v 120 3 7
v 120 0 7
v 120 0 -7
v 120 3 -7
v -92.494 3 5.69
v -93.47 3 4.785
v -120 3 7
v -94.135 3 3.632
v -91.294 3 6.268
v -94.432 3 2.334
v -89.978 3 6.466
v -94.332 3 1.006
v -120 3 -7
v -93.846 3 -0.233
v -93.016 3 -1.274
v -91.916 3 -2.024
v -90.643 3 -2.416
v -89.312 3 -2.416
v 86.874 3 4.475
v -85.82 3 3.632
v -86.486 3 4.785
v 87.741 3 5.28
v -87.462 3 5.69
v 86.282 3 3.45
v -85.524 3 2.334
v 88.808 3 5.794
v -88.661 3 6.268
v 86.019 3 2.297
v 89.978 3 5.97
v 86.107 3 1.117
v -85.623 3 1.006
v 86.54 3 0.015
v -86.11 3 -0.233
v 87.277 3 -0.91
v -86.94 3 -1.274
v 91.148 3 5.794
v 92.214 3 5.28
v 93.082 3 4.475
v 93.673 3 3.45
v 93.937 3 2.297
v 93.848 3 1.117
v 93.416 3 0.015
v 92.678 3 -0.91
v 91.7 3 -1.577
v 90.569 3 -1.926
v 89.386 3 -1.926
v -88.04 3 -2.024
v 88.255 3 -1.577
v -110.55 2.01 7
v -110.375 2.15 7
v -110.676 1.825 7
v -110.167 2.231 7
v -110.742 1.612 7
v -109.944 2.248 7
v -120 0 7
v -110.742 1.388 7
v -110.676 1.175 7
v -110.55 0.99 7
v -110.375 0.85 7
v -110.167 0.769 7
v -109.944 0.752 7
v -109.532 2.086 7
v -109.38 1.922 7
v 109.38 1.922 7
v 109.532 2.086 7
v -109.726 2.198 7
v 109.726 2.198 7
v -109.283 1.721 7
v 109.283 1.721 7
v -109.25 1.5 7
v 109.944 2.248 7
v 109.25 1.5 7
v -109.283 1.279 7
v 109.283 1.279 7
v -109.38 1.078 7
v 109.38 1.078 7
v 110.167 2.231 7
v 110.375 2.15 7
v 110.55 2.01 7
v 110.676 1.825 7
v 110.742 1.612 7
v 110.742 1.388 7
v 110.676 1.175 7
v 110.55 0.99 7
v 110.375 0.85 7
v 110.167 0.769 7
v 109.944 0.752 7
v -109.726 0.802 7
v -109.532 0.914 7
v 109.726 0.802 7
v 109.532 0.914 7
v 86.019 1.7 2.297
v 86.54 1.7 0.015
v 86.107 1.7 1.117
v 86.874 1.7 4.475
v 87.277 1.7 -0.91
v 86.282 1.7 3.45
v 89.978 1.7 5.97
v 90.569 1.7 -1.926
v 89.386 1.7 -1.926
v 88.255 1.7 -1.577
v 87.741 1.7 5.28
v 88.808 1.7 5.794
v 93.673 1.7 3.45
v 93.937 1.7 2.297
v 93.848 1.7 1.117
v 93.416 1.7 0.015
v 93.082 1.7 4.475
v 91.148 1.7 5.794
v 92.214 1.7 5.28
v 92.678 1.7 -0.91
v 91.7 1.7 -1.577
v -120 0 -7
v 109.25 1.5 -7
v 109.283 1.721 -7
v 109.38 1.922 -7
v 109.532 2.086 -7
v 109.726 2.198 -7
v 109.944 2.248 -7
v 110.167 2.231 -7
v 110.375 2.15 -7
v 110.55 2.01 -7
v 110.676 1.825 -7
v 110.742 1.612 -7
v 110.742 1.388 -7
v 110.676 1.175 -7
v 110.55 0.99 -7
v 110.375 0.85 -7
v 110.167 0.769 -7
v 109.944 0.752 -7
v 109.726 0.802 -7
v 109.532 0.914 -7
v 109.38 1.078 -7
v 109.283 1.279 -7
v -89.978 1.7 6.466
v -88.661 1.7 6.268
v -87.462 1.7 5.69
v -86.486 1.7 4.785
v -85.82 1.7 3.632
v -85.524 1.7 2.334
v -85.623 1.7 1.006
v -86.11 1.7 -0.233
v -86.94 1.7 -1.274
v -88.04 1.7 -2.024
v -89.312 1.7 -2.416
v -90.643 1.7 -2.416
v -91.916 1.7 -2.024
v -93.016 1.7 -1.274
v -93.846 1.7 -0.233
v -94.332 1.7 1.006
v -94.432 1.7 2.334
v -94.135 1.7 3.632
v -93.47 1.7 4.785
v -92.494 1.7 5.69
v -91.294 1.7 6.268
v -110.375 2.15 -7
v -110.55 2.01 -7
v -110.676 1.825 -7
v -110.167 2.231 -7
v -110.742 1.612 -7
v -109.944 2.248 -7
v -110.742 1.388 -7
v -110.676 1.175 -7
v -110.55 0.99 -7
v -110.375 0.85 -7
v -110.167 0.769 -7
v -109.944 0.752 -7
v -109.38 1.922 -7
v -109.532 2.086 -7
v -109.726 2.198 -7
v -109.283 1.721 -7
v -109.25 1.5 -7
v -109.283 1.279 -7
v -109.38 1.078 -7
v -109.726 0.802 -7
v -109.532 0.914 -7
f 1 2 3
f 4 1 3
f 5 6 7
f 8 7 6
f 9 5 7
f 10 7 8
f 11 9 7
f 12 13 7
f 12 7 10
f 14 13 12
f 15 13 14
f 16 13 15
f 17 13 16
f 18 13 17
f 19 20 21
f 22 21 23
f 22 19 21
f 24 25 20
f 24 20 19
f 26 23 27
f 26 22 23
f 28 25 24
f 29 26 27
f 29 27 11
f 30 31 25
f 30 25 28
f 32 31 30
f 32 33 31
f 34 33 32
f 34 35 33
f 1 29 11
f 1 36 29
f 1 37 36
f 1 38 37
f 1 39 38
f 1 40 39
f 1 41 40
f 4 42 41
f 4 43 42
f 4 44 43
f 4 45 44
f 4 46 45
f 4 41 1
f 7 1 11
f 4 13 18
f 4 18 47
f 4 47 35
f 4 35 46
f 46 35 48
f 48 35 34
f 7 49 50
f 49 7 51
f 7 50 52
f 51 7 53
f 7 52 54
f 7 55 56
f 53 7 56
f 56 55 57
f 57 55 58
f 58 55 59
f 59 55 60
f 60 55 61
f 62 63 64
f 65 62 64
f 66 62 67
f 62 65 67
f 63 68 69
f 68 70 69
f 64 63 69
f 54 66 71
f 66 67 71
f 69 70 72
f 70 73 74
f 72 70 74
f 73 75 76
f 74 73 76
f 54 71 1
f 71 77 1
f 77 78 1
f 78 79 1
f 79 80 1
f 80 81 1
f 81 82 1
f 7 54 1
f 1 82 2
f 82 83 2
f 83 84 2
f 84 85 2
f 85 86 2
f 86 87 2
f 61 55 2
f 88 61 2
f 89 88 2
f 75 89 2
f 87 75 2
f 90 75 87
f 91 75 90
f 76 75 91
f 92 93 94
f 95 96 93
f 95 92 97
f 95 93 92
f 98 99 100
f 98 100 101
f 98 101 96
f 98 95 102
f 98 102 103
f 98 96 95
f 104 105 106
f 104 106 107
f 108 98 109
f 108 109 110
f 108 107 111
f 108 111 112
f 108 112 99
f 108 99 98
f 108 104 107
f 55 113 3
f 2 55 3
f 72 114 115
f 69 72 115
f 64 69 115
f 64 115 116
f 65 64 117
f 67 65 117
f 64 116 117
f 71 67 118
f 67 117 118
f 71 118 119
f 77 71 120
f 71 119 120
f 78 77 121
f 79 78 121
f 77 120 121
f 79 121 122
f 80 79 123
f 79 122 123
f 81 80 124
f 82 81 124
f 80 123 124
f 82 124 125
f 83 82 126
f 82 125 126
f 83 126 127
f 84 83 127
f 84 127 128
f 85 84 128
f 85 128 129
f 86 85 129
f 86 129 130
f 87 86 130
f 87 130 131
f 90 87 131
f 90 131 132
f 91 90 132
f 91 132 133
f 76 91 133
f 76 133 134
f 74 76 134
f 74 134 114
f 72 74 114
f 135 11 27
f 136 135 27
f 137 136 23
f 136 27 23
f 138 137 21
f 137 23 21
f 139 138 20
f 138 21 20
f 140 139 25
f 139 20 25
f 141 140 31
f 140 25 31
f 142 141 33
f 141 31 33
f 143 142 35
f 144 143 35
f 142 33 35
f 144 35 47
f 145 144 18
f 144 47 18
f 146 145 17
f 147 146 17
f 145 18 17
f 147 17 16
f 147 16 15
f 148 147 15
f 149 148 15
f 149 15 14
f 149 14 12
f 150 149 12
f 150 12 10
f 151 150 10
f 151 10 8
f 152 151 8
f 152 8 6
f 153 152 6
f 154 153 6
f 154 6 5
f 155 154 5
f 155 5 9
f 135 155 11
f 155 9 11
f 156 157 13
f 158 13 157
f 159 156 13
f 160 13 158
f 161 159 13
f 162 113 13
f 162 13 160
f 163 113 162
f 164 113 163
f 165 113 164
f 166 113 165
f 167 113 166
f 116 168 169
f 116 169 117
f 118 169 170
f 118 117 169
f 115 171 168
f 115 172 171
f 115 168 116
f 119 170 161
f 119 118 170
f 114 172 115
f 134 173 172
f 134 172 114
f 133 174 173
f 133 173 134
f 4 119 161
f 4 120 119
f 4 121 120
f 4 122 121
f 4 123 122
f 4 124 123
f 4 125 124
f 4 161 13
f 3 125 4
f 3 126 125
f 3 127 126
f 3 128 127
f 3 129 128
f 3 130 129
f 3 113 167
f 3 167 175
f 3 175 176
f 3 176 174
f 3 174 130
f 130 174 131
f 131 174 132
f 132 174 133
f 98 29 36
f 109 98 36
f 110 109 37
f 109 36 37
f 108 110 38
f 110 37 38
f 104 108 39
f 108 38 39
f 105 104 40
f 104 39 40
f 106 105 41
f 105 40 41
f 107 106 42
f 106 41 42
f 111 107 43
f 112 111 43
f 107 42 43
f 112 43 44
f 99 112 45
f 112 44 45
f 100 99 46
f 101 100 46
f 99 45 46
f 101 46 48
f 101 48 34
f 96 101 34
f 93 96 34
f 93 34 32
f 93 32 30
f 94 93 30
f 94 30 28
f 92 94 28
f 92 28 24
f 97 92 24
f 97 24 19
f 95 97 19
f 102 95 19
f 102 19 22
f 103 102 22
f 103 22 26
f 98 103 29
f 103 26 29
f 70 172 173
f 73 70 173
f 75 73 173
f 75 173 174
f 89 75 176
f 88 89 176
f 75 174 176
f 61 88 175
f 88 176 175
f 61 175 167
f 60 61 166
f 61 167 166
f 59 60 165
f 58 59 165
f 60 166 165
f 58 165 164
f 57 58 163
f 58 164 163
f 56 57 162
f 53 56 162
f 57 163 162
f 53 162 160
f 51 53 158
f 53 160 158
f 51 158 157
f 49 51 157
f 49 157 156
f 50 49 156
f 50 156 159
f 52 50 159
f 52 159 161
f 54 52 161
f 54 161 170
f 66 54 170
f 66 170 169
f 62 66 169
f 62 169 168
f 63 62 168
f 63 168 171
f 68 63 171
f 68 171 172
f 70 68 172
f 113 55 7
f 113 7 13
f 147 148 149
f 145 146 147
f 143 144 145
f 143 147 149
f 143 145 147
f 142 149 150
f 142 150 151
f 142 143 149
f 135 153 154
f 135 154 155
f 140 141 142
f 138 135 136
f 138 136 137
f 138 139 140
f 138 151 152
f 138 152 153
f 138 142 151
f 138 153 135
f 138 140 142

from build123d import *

# Parameters (mm, degrees)
CROQUIS1_W              = 240
CROQUIS1_H              = 14
SALIENTE_EXTRUIR2_DEPTH = 3
CROQUIS3_R              = 4.466306423
CROQUIS3_R_2            = 3.970050153
CORTAR_EXTRUIR1_DEPTH   = 1.3
CROQUIS4_R              = 0.75
CORTAR_EXTRUIR2_DEPTH   = 121.851148112


with BuildPart() as part:
    # Croquis1 → Saliente-Extruir2 (new body)
    with BuildSketch(Plane(origin=(0, 0, 0), x_dir=(1, 0, 0), z_dir=(0, 1, 0))):
        Rectangle(CROQUIS1_W, CROQUIS1_H)
    extrude(amount=SALIENTE_EXTRUIR2_DEPTH)

    # Croquis3 → Cortar-Extruir1 (cut)
    with BuildSketch(Plane(origin=(0, 3, 0), x_dir=(1, 0, 0), z_dir=(0, 1, 0))):
        with Locations(Location((-89.977775034, -2, 0), (0, 0, 270))):
            Circle(CROQUIS3_R)
        with Locations(Location((89.977775034, -2, 0), (0, 0, 270))):
            Circle(CROQUIS3_R_2)
    extrude(amount=-CORTAR_EXTRUIR1_DEPTH, mode=Mode.SUBTRACT)

    # Croquis4 → Cortar-Extruir2 (cut, through all)
    with BuildSketch(Plane(origin=(0, 0, -7), x_dir=(-1, 0, 0), z_dir=(0, 0, -1))):
        with Locations((-110, 1.5)):
            Circle(CROQUIS4_R)
        with Locations(Location((110, 1.5, 0), (0, 0, 180))):
            Circle(CROQUIS4_R)
    extrude(amount=-CORTAR_EXTRUIR2_DEPTH, mode=Mode.SUBTRACT)


solid = part.part
